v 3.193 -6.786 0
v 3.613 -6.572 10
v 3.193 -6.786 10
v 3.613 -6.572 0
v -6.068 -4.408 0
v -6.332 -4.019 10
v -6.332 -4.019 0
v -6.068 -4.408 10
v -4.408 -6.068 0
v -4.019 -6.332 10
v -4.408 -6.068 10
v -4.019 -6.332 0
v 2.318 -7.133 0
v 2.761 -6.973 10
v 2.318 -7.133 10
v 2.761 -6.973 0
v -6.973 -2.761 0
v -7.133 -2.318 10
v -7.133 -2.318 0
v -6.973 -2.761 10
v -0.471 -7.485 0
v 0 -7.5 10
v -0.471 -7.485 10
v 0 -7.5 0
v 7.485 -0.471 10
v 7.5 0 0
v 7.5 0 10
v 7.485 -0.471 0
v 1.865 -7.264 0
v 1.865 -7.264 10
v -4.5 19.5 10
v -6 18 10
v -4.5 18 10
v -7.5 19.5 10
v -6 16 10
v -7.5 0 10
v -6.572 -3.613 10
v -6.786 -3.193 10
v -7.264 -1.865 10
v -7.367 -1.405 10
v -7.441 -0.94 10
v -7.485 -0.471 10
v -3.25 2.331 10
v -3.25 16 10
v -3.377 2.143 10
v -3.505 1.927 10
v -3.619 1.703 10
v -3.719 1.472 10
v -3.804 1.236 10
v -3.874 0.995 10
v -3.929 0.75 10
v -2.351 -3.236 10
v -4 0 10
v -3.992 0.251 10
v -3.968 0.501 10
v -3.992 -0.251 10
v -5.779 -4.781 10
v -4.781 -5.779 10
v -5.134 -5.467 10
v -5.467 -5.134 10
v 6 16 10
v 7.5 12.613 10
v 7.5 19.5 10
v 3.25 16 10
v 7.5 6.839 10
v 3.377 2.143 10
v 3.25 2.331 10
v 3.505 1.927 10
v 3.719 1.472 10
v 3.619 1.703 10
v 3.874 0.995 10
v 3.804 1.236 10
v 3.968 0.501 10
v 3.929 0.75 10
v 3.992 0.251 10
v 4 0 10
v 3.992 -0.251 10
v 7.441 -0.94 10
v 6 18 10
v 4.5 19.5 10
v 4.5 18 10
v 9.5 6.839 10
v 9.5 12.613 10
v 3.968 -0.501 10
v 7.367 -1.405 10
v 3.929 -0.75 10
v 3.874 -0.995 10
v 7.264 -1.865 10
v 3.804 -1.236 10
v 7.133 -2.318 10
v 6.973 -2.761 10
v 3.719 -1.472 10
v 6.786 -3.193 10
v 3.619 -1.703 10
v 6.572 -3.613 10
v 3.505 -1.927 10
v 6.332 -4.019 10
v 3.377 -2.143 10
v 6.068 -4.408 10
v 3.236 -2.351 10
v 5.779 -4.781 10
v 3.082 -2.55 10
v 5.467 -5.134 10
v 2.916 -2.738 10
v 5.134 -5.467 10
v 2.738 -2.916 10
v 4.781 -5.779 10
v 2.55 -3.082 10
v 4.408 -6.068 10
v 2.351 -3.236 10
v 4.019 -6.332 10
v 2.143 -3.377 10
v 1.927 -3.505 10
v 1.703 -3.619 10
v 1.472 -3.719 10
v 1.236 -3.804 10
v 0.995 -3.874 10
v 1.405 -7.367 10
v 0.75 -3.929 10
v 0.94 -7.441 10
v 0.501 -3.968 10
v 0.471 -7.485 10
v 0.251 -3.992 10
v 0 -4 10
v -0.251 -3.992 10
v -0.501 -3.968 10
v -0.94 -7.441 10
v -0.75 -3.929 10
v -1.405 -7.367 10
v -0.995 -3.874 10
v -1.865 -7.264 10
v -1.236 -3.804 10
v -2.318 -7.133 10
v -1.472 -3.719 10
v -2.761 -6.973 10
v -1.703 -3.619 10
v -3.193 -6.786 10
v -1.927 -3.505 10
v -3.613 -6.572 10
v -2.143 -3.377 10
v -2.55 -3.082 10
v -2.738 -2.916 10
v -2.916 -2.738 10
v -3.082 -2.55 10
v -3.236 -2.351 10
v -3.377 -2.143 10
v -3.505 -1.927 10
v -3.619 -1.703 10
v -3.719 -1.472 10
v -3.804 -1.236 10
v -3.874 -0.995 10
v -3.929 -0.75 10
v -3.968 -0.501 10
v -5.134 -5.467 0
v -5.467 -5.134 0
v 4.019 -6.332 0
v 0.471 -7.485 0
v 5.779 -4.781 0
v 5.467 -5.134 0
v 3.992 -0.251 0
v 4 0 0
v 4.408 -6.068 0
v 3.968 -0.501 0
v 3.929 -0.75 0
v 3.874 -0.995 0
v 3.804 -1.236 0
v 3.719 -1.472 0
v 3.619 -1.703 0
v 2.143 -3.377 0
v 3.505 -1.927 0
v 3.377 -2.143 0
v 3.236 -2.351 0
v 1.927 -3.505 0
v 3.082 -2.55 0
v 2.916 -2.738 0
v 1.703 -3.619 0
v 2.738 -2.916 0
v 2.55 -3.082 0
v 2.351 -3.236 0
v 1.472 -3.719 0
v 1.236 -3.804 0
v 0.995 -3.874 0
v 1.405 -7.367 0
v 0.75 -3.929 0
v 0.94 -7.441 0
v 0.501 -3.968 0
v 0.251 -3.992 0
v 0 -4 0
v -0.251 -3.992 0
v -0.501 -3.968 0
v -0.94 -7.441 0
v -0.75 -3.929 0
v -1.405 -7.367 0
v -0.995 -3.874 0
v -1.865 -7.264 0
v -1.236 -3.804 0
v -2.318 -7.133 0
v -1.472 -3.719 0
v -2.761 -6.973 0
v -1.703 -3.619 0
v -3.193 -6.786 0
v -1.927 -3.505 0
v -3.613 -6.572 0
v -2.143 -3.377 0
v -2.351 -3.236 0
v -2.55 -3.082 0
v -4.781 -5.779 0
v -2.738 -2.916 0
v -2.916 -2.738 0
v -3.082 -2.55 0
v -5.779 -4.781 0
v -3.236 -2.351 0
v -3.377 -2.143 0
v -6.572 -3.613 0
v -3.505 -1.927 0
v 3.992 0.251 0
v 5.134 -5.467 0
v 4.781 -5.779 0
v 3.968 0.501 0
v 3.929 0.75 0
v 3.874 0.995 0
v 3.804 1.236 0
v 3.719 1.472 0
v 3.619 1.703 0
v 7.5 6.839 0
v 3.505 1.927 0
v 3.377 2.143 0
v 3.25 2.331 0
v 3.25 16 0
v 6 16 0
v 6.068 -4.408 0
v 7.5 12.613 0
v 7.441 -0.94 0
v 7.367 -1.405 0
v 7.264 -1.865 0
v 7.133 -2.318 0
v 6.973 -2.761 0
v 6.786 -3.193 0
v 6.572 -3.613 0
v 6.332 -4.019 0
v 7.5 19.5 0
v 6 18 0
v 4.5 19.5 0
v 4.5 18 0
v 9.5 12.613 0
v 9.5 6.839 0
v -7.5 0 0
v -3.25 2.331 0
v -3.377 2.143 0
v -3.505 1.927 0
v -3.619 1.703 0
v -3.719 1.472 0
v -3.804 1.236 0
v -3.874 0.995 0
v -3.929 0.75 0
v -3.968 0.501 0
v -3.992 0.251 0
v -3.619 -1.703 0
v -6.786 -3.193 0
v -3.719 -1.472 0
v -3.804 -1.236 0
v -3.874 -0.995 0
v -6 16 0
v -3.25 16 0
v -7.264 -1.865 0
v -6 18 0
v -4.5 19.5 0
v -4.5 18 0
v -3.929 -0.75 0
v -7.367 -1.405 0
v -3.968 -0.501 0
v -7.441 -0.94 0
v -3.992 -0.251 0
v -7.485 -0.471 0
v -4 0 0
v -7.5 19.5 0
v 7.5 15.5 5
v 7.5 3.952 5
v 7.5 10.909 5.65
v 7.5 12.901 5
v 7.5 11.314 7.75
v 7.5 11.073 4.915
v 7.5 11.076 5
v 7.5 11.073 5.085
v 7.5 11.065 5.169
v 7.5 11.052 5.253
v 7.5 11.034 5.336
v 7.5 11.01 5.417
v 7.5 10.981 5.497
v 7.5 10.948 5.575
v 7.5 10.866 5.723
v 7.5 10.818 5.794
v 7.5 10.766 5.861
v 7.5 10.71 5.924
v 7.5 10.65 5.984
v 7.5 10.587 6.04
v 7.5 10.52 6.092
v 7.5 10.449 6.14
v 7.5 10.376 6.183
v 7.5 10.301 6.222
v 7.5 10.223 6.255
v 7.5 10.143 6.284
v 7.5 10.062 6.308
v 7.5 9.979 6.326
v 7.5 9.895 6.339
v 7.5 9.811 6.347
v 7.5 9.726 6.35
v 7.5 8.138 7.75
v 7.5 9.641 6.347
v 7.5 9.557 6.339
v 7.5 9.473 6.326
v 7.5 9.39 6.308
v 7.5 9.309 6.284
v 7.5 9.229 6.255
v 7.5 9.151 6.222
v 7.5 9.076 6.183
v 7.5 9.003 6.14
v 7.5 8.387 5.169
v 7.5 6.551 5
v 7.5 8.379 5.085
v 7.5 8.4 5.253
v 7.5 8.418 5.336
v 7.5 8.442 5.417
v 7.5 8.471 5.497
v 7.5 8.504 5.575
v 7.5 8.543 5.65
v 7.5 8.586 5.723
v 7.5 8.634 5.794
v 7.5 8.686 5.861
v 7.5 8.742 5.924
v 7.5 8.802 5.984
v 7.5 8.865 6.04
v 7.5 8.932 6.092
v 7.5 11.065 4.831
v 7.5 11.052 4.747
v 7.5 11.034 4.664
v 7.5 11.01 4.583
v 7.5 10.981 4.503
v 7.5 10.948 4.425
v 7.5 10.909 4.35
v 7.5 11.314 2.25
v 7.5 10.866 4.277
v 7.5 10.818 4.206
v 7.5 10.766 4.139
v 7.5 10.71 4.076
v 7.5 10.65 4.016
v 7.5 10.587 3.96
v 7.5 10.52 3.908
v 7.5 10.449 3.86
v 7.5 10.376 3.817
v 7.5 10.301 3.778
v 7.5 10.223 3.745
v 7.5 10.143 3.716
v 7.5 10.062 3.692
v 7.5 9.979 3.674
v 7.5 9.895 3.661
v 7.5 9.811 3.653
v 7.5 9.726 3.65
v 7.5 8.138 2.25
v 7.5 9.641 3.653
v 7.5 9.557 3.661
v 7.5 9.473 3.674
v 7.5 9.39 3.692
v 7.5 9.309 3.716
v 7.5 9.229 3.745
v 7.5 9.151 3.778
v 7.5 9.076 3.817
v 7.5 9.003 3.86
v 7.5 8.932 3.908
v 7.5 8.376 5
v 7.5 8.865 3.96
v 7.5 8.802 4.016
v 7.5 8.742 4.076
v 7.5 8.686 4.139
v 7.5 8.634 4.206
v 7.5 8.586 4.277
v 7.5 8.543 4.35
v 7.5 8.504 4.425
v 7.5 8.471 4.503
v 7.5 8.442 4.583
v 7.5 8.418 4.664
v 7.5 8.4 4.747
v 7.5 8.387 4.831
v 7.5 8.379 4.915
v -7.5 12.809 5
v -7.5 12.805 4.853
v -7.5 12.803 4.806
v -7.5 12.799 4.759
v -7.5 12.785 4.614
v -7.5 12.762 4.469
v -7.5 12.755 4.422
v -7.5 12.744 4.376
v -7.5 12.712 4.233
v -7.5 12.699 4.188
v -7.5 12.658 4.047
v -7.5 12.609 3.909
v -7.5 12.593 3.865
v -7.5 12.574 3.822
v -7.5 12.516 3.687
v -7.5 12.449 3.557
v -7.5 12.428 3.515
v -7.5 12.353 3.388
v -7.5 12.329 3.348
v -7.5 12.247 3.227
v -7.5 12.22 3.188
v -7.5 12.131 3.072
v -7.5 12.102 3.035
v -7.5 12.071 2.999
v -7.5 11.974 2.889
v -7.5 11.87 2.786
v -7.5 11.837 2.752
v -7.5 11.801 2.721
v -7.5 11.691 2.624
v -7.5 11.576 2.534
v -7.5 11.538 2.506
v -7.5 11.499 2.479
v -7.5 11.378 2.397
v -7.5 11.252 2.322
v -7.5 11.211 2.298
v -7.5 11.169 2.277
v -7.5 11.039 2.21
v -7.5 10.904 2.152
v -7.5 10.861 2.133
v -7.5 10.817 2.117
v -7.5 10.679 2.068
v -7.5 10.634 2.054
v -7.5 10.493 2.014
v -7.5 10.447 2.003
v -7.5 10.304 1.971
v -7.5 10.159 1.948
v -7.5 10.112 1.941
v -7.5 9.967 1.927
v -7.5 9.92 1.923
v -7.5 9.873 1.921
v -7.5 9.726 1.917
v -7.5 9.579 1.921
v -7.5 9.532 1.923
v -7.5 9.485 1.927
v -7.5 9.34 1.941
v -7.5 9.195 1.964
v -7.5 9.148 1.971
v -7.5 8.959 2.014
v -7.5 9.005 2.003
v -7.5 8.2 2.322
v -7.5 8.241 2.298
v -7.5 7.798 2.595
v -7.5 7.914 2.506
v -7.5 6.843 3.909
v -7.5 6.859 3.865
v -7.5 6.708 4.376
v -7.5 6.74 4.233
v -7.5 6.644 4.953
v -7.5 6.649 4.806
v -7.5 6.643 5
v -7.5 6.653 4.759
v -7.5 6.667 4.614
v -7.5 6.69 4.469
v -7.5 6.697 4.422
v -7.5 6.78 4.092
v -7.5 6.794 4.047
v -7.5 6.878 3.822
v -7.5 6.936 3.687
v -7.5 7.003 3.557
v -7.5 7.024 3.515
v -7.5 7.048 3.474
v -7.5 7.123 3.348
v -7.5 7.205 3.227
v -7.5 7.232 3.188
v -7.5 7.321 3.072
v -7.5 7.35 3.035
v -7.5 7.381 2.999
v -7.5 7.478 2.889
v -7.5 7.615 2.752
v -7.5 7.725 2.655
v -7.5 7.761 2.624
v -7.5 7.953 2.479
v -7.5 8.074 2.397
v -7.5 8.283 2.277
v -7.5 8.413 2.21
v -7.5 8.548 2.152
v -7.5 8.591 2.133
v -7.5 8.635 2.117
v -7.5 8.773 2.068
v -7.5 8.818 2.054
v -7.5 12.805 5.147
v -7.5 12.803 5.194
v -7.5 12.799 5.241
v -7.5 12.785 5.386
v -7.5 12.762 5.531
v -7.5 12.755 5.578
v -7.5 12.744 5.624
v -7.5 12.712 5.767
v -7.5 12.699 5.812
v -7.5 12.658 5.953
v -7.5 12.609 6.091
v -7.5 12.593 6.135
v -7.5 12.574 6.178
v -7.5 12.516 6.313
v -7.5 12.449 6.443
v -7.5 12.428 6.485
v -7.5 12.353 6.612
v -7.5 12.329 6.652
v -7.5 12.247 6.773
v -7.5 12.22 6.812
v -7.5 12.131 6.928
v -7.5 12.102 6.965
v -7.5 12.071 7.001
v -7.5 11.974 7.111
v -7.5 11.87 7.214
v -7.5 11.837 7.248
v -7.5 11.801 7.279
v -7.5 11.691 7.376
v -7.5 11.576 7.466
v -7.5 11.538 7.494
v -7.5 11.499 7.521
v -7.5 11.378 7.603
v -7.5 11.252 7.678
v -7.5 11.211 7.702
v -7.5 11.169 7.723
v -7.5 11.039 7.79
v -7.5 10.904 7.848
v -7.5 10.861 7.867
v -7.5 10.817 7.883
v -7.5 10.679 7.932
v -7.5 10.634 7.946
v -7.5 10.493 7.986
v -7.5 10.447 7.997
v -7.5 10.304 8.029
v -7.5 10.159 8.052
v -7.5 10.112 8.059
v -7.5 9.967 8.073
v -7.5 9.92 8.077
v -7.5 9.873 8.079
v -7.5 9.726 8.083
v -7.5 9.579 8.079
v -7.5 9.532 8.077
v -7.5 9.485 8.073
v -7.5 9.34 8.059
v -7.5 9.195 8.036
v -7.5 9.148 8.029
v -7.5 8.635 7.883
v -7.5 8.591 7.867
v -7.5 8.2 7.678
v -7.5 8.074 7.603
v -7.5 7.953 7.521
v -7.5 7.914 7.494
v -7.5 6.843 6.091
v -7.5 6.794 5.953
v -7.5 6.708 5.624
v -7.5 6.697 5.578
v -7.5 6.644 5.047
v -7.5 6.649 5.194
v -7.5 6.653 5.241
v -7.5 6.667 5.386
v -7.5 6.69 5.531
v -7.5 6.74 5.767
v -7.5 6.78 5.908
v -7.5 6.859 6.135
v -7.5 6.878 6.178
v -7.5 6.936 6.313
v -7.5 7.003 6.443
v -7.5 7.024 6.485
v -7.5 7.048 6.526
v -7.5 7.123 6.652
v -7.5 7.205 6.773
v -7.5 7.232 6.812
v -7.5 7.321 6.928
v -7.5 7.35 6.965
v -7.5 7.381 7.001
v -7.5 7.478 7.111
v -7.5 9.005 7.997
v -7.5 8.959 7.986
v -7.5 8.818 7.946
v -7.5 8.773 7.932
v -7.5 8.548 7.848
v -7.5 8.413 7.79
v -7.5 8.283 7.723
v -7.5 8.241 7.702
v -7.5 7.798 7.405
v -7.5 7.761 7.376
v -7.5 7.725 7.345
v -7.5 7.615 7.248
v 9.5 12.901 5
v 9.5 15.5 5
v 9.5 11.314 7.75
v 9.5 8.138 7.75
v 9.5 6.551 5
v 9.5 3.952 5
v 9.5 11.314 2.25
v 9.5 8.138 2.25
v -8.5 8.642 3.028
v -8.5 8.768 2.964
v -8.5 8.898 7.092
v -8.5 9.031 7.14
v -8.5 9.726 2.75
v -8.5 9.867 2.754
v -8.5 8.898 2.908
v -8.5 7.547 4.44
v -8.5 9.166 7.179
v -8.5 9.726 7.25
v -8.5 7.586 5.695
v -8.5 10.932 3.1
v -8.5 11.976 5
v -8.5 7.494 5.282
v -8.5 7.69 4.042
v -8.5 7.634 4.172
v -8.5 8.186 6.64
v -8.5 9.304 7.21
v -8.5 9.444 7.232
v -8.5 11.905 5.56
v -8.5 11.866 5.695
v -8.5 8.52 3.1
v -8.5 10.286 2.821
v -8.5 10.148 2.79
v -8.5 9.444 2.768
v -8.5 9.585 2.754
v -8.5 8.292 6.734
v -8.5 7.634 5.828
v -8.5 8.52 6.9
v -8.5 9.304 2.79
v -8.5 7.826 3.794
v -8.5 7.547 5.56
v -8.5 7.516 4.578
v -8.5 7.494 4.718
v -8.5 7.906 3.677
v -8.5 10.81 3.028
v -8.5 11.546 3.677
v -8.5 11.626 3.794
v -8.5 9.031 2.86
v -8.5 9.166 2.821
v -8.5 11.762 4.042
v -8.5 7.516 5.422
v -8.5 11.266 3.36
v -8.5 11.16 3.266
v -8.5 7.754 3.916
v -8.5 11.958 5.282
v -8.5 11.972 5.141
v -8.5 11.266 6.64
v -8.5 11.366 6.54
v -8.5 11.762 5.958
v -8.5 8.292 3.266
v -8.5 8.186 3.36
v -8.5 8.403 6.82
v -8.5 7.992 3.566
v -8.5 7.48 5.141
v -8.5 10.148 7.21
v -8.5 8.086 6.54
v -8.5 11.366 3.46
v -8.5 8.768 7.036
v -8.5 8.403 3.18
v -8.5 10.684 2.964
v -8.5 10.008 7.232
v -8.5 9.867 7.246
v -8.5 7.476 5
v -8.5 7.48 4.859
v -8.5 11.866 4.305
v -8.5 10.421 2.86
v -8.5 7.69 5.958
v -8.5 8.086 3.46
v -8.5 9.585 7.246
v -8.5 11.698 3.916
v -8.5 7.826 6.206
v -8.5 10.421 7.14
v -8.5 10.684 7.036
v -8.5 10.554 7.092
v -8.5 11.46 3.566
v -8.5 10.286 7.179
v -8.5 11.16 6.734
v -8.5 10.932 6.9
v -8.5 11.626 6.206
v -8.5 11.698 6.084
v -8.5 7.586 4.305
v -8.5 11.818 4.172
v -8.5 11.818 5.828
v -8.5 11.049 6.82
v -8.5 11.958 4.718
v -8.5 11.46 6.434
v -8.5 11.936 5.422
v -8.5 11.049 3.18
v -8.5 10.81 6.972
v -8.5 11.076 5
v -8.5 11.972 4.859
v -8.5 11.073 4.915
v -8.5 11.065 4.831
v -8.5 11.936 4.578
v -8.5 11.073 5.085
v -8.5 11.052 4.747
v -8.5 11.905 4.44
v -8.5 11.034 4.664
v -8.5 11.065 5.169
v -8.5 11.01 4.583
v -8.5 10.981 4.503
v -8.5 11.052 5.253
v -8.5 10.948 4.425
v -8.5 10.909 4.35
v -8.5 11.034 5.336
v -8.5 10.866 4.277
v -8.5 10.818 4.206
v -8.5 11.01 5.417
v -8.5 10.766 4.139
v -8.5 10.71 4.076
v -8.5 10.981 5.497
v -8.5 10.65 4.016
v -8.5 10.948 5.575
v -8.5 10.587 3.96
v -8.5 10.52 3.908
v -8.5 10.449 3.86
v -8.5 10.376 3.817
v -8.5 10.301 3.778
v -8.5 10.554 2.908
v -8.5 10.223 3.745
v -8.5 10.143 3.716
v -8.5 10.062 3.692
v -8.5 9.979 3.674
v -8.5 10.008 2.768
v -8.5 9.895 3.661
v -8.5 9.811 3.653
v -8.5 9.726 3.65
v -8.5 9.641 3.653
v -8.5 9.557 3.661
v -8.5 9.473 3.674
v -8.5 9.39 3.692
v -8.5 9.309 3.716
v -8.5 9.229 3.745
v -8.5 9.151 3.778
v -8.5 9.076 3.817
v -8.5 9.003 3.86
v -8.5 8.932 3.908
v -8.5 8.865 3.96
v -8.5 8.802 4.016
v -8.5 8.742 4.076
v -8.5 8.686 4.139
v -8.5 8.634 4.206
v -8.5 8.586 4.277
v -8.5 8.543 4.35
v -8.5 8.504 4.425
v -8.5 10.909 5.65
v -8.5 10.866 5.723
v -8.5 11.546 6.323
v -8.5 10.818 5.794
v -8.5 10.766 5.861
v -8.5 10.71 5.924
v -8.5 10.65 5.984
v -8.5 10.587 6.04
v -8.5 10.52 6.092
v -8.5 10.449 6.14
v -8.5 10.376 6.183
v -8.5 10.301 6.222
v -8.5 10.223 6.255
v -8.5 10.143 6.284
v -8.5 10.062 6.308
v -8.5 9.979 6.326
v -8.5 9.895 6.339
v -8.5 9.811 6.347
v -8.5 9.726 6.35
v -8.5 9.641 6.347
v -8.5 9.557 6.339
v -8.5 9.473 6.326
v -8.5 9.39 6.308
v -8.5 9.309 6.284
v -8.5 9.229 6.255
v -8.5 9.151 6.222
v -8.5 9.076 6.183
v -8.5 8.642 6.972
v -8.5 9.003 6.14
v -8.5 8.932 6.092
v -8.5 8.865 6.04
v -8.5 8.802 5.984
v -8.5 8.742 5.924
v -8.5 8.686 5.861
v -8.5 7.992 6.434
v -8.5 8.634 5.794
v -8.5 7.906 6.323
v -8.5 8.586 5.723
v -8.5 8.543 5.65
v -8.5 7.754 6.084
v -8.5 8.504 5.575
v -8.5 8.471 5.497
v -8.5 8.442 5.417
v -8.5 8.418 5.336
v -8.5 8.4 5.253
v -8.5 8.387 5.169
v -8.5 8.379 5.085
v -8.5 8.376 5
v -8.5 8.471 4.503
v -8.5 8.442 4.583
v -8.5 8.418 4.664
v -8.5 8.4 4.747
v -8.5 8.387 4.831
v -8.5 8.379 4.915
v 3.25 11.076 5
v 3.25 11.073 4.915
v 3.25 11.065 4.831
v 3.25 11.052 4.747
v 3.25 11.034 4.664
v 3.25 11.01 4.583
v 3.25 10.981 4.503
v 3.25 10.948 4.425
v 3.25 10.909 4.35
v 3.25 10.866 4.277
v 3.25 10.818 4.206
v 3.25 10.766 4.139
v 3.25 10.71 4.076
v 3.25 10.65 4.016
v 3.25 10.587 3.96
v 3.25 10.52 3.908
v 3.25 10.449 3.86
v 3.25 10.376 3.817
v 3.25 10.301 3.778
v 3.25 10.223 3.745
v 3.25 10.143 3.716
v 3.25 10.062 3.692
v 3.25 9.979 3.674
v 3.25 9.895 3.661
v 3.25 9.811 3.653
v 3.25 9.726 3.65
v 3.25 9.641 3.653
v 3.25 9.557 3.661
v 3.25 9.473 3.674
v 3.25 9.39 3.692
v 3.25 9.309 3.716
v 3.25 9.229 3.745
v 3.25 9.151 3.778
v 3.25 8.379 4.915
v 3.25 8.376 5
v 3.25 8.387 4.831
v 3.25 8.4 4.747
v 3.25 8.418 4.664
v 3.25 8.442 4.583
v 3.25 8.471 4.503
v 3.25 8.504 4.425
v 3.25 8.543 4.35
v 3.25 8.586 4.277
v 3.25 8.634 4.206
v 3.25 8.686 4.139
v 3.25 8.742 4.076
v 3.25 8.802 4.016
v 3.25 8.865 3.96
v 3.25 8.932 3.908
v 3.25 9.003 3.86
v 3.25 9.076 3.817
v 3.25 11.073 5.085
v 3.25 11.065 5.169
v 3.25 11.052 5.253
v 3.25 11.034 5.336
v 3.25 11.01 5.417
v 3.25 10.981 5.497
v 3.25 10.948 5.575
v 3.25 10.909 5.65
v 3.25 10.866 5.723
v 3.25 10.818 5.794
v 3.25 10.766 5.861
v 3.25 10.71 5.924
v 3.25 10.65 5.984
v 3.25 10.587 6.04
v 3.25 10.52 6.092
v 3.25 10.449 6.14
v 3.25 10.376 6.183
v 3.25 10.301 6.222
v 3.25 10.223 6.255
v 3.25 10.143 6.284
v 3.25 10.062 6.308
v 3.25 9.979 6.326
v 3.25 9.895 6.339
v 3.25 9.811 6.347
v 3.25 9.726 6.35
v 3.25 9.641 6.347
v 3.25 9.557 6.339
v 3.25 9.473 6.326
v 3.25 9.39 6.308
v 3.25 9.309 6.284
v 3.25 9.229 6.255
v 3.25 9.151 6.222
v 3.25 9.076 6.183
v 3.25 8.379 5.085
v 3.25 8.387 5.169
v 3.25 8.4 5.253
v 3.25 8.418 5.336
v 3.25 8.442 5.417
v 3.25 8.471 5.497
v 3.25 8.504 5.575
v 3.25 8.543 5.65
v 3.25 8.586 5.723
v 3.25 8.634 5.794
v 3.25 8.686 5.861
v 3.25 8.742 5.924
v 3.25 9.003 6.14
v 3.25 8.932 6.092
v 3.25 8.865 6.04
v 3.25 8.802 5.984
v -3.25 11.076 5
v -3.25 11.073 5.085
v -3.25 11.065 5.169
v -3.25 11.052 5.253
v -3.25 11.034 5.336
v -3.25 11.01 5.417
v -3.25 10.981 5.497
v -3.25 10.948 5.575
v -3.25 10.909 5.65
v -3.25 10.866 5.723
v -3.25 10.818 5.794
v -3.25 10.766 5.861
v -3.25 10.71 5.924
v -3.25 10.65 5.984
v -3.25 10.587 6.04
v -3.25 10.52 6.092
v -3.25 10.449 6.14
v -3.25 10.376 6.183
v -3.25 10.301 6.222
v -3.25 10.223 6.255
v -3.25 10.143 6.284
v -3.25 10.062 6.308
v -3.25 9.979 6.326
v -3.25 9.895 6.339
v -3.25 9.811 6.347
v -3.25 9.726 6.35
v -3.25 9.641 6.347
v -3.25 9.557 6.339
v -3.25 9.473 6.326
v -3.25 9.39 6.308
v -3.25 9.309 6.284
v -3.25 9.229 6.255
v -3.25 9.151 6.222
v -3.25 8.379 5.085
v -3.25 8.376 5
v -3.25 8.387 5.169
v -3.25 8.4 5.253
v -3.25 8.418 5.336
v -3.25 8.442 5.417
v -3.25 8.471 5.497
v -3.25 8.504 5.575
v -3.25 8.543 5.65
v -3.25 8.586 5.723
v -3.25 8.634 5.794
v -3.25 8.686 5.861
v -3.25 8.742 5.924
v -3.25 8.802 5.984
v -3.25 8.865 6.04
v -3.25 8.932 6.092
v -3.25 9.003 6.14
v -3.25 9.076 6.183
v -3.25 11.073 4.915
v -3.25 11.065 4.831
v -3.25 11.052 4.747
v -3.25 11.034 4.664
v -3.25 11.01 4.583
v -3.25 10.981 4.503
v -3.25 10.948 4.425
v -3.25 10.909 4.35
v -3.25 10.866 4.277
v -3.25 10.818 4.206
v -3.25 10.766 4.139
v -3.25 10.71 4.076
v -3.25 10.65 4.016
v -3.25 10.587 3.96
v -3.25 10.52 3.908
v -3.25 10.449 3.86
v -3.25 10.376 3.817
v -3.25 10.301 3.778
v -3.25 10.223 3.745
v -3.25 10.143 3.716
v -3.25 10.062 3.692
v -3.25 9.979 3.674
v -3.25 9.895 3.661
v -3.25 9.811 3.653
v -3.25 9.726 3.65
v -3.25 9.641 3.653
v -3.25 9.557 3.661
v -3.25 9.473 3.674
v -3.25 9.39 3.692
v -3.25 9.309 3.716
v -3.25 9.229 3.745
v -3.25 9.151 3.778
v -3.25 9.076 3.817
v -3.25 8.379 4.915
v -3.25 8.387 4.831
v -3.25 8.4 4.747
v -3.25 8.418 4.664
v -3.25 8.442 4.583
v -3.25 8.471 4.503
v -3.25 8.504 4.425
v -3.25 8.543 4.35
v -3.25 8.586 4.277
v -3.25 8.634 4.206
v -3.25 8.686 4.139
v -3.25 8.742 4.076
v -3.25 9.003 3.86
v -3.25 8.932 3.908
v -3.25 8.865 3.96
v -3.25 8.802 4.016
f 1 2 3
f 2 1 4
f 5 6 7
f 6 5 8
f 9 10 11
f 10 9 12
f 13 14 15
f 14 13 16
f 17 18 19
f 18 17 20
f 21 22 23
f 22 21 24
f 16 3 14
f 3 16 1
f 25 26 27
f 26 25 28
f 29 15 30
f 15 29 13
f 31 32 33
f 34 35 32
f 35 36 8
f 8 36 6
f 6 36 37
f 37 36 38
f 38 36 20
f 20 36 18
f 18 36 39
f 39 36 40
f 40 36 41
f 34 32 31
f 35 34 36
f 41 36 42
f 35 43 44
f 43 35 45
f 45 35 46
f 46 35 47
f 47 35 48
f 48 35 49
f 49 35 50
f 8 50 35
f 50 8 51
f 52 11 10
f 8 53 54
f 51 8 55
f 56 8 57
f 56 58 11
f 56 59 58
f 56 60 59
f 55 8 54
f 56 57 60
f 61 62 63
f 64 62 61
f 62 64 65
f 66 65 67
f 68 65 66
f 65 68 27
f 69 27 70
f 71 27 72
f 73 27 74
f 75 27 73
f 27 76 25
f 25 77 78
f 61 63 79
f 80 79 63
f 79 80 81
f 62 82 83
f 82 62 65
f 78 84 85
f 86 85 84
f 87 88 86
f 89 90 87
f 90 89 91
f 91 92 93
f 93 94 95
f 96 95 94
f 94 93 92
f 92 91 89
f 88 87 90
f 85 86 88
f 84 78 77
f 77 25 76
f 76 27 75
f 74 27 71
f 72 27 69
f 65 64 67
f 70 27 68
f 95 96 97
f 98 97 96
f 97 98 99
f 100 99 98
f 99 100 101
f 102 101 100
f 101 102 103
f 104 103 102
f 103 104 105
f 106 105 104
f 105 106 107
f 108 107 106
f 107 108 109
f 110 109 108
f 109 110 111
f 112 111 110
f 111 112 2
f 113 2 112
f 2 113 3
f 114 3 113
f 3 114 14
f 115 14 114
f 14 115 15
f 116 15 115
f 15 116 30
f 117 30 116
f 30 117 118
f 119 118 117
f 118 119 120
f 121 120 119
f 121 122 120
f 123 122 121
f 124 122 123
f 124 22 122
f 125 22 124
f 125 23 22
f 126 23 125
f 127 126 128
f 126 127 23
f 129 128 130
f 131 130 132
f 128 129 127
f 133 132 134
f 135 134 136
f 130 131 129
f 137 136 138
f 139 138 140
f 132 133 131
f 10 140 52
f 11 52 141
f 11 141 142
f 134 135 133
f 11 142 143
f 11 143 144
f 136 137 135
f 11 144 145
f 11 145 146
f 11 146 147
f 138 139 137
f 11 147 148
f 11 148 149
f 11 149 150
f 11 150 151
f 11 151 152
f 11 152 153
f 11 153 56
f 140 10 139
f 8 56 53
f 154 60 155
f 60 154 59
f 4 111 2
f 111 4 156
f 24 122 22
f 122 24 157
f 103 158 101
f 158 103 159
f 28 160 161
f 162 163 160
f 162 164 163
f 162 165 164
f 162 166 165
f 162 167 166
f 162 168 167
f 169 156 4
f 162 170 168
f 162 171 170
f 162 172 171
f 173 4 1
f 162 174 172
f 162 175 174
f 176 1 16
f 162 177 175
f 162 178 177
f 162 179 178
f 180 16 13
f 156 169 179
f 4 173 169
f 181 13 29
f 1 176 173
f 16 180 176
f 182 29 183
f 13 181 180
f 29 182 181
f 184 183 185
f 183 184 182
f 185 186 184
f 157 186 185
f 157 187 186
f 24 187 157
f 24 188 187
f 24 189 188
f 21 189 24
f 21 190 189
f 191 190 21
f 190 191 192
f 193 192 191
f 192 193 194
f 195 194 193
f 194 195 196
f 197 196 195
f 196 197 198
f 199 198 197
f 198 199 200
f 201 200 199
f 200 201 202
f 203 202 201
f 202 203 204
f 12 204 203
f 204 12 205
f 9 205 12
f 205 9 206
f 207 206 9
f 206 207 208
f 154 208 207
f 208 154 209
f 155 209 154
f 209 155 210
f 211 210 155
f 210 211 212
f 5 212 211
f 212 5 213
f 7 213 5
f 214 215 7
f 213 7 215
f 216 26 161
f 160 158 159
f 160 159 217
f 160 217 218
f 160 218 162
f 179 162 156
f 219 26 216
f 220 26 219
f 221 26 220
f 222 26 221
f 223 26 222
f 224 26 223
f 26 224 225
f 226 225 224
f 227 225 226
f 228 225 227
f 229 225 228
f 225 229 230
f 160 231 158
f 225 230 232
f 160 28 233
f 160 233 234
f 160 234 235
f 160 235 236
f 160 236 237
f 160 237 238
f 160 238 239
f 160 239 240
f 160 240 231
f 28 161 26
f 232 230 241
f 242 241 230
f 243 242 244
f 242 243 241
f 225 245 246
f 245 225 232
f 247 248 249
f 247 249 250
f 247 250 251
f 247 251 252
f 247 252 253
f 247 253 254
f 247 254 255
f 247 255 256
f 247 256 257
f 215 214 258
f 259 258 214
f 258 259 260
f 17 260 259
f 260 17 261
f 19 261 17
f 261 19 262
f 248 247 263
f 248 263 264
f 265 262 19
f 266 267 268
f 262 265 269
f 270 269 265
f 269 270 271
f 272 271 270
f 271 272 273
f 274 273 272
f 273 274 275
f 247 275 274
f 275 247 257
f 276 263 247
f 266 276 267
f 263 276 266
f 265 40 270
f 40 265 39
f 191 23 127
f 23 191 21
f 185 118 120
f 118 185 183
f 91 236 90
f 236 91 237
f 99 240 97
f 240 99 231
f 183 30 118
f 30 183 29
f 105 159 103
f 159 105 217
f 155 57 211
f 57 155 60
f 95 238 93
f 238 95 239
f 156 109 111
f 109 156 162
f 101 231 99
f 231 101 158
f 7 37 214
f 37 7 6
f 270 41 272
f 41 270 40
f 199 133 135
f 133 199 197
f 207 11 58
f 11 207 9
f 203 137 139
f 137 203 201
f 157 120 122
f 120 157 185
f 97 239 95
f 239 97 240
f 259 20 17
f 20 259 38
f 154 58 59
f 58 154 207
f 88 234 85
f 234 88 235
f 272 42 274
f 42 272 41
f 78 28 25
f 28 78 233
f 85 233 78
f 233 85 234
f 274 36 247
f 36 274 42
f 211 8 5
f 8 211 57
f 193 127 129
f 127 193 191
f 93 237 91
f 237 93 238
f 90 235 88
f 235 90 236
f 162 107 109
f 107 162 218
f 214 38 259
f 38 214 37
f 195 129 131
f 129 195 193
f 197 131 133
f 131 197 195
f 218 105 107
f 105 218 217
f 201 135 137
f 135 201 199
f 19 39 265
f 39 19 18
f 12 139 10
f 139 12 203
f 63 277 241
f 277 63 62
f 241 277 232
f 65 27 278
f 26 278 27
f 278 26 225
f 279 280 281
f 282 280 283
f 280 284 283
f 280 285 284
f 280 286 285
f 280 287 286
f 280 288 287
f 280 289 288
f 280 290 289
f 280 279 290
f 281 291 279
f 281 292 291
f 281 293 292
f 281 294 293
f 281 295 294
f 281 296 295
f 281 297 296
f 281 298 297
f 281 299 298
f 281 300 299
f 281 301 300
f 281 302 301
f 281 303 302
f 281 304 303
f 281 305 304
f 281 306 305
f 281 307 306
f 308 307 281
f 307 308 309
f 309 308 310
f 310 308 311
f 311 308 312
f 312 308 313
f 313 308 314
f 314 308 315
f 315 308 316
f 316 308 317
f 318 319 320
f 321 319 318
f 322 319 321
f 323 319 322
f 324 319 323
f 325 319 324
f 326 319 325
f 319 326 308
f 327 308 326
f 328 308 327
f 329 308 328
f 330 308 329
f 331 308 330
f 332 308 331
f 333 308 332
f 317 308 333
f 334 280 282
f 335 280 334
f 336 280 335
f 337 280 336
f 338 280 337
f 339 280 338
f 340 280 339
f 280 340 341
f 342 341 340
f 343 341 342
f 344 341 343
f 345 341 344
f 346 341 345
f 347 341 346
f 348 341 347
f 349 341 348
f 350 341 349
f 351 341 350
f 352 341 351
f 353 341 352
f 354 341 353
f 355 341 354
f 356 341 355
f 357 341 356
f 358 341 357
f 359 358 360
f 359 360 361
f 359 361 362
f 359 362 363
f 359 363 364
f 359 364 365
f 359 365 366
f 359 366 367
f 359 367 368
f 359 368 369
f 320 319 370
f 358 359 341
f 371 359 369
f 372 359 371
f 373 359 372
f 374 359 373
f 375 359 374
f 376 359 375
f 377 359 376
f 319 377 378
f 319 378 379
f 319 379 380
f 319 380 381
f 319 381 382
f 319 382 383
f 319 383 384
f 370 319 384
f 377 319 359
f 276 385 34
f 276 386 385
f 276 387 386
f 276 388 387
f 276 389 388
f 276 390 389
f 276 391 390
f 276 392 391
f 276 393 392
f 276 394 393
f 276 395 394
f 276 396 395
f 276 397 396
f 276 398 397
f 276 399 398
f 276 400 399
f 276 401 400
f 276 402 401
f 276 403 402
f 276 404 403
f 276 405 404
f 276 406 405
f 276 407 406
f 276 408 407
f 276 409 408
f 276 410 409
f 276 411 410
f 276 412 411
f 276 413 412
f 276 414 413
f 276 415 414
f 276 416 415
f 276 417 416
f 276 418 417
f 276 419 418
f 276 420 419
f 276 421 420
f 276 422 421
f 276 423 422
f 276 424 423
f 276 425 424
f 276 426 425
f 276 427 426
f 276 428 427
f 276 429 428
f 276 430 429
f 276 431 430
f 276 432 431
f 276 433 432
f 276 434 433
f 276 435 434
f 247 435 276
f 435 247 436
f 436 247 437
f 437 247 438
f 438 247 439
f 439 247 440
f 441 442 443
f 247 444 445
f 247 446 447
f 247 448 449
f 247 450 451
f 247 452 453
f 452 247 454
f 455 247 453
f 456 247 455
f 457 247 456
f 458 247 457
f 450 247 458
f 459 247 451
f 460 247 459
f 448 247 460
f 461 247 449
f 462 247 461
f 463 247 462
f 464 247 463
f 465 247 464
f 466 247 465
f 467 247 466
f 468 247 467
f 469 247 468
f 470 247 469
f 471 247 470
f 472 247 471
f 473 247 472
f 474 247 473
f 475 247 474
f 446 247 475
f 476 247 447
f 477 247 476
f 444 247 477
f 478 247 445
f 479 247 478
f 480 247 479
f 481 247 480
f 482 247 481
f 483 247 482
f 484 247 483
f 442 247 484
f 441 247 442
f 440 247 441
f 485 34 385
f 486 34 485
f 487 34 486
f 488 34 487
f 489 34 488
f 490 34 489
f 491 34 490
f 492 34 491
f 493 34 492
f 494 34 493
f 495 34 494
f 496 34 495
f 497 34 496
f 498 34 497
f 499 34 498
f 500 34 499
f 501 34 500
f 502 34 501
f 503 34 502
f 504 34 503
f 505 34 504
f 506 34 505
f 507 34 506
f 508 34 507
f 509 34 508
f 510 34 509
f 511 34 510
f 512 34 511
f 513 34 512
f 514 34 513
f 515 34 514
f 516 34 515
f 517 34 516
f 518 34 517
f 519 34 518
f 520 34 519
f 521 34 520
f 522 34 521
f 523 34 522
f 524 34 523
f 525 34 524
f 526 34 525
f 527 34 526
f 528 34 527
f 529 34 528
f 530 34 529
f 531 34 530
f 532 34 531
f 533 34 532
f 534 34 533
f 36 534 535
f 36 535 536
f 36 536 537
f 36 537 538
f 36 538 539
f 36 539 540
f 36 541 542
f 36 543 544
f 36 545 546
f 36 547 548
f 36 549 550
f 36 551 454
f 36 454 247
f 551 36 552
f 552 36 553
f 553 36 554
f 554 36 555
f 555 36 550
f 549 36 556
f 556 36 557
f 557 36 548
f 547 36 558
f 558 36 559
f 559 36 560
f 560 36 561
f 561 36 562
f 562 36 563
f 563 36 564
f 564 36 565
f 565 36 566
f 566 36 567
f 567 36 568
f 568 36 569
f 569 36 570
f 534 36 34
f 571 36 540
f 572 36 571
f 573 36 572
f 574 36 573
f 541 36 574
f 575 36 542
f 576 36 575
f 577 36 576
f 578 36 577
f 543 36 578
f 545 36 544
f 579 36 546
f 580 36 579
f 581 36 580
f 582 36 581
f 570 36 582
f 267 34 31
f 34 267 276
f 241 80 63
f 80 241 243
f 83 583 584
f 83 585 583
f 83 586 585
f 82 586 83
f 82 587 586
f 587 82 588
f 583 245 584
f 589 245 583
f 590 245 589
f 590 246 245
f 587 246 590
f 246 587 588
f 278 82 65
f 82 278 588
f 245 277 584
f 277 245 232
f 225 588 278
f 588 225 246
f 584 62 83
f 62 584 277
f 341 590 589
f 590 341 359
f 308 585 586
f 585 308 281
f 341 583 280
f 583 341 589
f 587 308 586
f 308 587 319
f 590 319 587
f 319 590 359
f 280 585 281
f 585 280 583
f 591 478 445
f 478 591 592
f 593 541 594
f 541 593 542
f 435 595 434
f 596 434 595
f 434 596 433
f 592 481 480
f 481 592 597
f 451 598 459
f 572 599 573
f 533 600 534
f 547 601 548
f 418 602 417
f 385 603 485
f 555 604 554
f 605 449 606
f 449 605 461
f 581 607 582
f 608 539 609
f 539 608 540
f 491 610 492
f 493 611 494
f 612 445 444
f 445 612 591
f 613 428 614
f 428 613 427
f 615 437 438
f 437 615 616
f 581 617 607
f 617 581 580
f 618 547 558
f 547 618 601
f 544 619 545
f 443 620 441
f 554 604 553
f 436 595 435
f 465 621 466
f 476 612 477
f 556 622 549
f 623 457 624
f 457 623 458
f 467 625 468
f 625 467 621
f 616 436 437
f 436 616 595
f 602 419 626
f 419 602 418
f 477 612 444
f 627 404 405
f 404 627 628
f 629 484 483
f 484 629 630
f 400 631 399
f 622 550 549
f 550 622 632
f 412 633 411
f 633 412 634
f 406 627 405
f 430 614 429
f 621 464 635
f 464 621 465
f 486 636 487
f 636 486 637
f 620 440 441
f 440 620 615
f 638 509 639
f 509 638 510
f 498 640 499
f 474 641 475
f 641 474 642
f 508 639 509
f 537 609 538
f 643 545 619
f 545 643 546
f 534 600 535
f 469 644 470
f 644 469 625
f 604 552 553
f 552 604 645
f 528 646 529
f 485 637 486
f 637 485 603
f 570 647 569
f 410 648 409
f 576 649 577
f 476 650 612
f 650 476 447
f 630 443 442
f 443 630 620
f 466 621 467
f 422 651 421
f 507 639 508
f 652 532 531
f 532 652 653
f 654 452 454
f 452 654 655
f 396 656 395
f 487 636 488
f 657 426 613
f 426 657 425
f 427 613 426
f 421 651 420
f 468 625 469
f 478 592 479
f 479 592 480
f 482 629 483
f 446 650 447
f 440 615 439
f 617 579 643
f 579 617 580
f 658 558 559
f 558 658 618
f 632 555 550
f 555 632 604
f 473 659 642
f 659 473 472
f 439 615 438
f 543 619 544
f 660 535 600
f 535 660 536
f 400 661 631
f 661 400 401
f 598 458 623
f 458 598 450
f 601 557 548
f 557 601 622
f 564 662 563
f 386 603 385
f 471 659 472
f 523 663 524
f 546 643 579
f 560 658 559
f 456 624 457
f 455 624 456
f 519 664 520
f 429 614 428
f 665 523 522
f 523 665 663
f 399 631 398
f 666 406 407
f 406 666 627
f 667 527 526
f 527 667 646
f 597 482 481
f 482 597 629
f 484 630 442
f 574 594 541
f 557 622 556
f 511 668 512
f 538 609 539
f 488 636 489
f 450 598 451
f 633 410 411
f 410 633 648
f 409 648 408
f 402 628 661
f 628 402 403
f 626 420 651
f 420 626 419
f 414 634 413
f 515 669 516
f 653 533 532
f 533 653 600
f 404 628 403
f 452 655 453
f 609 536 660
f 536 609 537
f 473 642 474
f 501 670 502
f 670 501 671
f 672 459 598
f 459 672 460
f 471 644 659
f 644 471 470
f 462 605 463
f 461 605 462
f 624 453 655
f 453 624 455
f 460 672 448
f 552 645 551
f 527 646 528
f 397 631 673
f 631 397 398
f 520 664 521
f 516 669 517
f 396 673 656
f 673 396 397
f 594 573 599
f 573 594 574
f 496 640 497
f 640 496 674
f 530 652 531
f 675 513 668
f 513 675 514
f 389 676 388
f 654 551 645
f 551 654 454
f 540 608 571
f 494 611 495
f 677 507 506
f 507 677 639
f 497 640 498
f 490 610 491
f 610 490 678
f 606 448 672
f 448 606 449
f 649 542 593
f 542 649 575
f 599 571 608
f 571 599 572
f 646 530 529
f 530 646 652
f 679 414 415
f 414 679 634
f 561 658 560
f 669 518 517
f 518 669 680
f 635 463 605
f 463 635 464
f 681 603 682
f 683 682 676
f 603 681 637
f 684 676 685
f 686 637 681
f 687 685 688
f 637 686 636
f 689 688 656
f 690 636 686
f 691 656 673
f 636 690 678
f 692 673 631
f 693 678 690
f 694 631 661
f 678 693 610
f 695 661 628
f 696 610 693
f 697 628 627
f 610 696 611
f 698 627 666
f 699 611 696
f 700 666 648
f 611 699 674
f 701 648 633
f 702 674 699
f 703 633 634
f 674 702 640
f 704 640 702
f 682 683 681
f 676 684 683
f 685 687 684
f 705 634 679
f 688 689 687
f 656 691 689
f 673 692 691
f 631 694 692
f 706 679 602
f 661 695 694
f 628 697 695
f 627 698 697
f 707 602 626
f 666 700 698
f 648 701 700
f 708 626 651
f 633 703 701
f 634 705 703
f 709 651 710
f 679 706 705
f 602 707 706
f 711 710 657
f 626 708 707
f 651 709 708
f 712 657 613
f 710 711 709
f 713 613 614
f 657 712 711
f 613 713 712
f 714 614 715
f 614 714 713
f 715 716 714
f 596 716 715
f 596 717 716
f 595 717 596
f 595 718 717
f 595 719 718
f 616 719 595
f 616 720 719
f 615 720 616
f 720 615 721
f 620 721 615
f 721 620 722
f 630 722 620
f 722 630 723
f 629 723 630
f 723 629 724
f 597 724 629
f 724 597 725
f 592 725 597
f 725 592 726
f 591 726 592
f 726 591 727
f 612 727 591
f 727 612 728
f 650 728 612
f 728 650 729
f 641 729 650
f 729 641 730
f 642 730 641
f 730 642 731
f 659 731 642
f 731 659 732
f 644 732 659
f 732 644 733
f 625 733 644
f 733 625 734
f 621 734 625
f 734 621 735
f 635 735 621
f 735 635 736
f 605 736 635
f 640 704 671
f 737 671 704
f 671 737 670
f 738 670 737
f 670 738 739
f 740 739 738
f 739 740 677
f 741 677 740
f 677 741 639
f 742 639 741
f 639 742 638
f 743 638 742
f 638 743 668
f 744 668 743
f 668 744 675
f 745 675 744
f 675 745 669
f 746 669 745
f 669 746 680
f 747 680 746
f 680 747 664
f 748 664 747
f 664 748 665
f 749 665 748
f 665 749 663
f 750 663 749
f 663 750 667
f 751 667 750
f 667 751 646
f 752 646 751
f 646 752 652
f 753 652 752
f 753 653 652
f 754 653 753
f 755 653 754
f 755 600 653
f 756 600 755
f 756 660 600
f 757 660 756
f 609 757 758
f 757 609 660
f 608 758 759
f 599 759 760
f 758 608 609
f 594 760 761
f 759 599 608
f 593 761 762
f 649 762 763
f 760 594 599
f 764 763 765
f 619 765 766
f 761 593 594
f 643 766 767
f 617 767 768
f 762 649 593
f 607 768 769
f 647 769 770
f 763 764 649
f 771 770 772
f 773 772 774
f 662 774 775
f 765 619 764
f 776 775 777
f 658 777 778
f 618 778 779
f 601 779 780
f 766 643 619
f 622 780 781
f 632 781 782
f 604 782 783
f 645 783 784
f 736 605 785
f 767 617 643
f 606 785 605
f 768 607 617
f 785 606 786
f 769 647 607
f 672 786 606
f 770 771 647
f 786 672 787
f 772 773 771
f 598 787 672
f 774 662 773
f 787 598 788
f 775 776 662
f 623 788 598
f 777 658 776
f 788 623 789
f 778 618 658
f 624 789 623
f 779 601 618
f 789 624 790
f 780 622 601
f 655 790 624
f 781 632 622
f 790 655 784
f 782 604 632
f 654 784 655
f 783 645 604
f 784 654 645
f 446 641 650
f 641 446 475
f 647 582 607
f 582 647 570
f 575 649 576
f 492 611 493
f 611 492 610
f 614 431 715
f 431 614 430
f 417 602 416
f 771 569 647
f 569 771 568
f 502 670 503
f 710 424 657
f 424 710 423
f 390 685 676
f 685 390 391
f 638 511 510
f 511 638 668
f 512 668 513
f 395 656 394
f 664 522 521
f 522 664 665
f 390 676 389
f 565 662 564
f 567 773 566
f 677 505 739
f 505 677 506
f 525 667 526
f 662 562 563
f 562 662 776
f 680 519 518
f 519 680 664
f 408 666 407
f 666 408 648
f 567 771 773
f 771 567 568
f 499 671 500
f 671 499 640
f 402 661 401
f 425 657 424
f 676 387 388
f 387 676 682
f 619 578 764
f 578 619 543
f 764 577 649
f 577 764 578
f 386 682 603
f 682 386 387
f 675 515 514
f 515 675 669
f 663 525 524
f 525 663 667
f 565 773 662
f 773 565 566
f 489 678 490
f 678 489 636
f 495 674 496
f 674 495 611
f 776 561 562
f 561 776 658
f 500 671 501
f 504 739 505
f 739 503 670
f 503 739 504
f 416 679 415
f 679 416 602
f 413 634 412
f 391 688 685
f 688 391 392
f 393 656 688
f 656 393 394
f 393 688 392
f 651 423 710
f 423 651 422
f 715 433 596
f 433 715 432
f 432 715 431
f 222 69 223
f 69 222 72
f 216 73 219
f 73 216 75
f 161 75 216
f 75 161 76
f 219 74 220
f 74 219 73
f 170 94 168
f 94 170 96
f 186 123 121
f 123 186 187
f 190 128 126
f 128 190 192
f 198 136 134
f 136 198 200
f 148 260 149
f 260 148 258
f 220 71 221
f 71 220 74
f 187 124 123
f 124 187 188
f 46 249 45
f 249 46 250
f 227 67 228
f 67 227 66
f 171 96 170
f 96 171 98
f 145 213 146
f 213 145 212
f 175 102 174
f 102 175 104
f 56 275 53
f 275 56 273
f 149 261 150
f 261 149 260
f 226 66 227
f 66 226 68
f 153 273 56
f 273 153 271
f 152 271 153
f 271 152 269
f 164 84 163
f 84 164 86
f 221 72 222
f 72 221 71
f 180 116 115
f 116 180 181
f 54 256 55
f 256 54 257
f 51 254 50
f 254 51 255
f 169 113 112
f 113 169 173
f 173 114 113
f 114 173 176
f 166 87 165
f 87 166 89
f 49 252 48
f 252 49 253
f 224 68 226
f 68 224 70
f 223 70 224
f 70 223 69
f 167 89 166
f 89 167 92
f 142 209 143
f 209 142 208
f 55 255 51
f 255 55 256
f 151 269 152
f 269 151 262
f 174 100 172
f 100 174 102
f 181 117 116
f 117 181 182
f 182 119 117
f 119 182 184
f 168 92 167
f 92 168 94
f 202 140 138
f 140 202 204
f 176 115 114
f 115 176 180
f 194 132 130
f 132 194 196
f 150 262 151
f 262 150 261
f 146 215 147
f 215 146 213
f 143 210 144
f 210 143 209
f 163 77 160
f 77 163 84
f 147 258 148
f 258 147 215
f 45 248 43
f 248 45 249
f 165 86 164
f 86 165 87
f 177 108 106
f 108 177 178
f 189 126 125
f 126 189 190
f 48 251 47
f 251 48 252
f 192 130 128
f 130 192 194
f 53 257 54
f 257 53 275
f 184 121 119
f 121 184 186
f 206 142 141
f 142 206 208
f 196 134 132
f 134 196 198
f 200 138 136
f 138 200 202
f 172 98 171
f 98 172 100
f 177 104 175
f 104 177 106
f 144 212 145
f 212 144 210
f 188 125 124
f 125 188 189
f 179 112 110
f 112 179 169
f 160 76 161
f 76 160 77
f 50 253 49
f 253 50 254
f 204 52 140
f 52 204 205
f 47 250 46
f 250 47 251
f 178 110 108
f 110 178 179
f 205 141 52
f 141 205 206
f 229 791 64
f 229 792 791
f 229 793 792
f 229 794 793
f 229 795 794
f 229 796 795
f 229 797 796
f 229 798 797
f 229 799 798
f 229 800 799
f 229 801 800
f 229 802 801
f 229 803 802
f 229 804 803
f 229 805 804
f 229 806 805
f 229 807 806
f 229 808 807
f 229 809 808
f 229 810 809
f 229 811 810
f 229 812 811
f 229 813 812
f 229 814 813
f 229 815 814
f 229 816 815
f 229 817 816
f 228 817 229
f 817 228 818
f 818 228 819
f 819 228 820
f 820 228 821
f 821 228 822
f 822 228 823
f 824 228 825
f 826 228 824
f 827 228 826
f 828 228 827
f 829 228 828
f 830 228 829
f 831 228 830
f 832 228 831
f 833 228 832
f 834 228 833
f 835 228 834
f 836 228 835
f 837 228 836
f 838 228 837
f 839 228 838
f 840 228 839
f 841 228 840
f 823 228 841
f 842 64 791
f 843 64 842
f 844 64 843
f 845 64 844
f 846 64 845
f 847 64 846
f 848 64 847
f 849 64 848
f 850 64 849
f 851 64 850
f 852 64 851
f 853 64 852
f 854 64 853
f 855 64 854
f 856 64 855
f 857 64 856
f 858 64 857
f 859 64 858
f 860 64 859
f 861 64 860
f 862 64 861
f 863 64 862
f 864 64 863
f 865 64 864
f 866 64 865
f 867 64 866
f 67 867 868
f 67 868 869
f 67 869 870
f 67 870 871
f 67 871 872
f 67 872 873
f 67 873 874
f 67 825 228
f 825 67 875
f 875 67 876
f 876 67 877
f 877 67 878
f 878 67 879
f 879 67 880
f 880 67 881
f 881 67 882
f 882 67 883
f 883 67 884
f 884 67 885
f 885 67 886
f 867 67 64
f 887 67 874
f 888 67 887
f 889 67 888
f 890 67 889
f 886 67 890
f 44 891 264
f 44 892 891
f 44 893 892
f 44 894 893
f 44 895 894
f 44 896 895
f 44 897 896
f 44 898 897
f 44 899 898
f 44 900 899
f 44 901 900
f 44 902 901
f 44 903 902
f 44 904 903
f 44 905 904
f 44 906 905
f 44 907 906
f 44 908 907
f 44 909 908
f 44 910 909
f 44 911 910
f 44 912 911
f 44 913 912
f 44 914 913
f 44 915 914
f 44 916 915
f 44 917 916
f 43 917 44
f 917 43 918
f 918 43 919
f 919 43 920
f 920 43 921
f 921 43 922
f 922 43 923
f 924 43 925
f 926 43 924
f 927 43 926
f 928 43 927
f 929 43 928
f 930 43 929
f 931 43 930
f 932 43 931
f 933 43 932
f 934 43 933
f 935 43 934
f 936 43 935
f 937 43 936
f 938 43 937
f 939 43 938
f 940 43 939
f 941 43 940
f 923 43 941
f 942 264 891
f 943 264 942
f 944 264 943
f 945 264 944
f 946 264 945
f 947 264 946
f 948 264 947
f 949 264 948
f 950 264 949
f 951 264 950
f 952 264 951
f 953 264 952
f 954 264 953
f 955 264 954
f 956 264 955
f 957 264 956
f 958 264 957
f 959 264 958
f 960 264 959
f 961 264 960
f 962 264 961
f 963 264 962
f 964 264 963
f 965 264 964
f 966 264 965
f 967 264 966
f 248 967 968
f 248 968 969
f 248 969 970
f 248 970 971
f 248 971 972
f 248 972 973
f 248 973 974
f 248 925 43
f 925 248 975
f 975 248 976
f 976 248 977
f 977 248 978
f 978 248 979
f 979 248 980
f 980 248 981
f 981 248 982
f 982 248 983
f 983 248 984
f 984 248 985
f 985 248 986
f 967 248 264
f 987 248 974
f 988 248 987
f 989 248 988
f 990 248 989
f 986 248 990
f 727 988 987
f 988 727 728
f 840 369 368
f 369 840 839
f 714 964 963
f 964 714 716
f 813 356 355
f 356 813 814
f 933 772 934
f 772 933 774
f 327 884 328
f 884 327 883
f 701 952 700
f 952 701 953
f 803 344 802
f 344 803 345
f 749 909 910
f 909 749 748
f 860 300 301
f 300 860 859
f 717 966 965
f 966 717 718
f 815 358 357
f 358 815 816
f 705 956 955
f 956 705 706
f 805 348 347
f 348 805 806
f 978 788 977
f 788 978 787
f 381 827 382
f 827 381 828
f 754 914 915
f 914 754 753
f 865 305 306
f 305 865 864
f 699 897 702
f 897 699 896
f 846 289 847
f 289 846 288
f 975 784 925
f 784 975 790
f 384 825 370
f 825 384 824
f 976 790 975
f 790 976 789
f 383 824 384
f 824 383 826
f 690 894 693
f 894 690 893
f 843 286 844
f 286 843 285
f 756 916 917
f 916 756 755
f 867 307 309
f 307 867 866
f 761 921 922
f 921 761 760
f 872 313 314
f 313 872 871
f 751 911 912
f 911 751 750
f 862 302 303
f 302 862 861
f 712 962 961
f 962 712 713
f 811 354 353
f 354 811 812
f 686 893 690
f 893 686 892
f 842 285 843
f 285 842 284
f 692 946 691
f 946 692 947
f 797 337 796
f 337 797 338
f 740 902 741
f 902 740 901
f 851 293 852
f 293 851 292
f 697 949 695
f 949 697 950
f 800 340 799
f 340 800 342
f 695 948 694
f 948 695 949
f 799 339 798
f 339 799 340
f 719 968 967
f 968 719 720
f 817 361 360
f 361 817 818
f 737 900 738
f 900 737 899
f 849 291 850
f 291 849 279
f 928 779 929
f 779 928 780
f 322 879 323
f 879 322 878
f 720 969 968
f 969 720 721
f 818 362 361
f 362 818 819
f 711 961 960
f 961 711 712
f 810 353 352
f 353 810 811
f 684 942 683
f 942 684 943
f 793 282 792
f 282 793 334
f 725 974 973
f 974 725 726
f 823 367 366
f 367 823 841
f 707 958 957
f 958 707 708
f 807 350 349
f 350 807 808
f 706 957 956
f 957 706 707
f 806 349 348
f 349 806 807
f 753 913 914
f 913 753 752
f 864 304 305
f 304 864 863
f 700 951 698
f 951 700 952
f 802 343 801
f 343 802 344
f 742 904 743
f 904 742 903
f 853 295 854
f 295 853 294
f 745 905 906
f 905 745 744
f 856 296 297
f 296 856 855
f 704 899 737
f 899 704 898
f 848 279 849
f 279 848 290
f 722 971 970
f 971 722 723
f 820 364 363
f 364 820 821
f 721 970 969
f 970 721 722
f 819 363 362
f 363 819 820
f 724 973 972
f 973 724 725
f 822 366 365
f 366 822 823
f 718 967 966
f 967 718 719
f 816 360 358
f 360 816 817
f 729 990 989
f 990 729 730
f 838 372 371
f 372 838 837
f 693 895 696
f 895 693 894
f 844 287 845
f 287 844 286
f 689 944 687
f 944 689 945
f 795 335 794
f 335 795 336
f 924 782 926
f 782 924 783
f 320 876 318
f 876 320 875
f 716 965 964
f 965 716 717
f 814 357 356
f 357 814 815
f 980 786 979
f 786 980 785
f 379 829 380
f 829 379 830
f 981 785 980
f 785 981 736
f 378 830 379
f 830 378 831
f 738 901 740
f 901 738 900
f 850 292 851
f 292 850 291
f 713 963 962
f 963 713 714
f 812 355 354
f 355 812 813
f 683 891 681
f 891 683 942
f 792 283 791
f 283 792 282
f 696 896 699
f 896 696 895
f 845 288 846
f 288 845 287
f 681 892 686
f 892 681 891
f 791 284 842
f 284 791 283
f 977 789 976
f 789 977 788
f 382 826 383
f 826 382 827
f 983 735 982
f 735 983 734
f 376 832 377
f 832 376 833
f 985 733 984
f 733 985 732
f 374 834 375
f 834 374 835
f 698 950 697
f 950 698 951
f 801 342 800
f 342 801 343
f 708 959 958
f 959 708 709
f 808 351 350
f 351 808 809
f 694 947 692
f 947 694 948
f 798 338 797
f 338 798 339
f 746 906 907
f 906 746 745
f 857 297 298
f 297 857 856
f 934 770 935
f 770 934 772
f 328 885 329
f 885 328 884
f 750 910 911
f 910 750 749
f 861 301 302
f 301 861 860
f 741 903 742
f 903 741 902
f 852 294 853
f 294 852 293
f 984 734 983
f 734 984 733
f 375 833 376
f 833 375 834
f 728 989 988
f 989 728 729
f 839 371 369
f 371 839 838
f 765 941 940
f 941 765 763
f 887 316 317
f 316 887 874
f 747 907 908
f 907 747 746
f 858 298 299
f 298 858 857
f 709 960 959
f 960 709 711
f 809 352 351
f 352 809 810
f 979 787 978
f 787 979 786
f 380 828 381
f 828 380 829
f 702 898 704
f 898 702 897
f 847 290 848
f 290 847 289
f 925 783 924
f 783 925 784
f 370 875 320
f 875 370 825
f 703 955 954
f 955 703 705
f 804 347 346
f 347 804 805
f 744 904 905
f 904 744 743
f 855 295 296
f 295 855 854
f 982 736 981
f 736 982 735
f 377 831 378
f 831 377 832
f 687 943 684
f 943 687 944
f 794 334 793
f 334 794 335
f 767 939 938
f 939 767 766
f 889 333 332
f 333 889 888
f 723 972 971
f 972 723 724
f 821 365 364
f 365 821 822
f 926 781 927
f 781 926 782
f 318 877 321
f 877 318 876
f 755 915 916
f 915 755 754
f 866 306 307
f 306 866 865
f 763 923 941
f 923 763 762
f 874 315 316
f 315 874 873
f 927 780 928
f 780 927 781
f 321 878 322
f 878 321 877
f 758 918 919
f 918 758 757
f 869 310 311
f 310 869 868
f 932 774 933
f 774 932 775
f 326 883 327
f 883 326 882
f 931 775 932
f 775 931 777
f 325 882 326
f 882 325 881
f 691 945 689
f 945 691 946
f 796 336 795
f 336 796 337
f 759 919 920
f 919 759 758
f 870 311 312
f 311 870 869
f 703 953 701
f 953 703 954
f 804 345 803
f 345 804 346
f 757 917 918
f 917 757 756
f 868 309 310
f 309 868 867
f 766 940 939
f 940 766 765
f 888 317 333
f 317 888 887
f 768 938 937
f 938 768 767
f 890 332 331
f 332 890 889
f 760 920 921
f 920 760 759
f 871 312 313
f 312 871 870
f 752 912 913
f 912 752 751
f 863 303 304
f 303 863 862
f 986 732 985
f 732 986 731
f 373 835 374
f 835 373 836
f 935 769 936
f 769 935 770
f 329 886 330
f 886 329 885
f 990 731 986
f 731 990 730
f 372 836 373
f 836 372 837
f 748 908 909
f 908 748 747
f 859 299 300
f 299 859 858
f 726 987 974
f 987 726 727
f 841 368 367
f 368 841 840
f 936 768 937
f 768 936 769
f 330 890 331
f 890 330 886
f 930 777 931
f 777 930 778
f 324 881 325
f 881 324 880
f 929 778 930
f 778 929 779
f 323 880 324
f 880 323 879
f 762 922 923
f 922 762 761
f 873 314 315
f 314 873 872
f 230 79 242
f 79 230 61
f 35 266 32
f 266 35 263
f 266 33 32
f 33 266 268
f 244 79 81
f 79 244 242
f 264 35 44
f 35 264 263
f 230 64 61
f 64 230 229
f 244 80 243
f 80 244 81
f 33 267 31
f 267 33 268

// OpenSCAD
$fn = 100;



module Nut(key, h){
    function cot(x)=1/tan(x);
	angle = 360/6;
	cote = key * cot(angle);
	echo(angle, cot(angle), cote);
	echo(acos(.6));

	union()
	{
		rotate([0,0,0])
			cube([key,cote,h],center=true);
		rotate([0,0,angle])
			cube([key,cote,h],center=true);
		rotate([0,0,2*angle])
			cube([key,cote,h],center=true);
	}
}


module BaseClip(height){
    union(){
        translate([0, 0, 0])
            rotate([0, 0, 0])
                cylinder(d=15, h=height);
        translate([-7.5, 0, 0])
            rotate([0, 0, 0])
                cube([15, 19.5, height]);
    }
}

module ClipCutOut(height){
    union(){
        translate([0, 0, 0])
            rotate([0, 0, 0])
                cylinder(d=8, h=height);
        translate([-3.25, 0, 0])
            rotate([0, 0, 0])
                cube([6.5, 19.5, height]);
    }
}

module NutHolder(key){
    difference(){
        Nut(10, 2);
        Nut(key, 2);
    }
}


module BoltStandOff(){
       
}

module Clip(height){
    difference(){
        union(){
            BaseClip(height);
            translate([8.5, 9.726, 5])
                rotate([0, 90, 0])
                    NutHolder(5.5);
            translate([-8.5, 9.726, 5])
                rotate([0, 90, 0])
                    cylinder(d1=4.5, d2=7, h=1.5);
        }
        ClipCutOut(height);
        translate([0, 9.726, 5])
            rotate([0, 90, 0])
                cylinder(d=2.7, h=20, center=true);
        translate([0, 17, 5])
            rotate([0, 90, 0])
                cube([12, 2, 12], center=true);
        translate([0, 19, 5])
            rotate([0, 90, 0])
                cube([12, 5, 9], center=true);
        
    }
}

Clip(10);
